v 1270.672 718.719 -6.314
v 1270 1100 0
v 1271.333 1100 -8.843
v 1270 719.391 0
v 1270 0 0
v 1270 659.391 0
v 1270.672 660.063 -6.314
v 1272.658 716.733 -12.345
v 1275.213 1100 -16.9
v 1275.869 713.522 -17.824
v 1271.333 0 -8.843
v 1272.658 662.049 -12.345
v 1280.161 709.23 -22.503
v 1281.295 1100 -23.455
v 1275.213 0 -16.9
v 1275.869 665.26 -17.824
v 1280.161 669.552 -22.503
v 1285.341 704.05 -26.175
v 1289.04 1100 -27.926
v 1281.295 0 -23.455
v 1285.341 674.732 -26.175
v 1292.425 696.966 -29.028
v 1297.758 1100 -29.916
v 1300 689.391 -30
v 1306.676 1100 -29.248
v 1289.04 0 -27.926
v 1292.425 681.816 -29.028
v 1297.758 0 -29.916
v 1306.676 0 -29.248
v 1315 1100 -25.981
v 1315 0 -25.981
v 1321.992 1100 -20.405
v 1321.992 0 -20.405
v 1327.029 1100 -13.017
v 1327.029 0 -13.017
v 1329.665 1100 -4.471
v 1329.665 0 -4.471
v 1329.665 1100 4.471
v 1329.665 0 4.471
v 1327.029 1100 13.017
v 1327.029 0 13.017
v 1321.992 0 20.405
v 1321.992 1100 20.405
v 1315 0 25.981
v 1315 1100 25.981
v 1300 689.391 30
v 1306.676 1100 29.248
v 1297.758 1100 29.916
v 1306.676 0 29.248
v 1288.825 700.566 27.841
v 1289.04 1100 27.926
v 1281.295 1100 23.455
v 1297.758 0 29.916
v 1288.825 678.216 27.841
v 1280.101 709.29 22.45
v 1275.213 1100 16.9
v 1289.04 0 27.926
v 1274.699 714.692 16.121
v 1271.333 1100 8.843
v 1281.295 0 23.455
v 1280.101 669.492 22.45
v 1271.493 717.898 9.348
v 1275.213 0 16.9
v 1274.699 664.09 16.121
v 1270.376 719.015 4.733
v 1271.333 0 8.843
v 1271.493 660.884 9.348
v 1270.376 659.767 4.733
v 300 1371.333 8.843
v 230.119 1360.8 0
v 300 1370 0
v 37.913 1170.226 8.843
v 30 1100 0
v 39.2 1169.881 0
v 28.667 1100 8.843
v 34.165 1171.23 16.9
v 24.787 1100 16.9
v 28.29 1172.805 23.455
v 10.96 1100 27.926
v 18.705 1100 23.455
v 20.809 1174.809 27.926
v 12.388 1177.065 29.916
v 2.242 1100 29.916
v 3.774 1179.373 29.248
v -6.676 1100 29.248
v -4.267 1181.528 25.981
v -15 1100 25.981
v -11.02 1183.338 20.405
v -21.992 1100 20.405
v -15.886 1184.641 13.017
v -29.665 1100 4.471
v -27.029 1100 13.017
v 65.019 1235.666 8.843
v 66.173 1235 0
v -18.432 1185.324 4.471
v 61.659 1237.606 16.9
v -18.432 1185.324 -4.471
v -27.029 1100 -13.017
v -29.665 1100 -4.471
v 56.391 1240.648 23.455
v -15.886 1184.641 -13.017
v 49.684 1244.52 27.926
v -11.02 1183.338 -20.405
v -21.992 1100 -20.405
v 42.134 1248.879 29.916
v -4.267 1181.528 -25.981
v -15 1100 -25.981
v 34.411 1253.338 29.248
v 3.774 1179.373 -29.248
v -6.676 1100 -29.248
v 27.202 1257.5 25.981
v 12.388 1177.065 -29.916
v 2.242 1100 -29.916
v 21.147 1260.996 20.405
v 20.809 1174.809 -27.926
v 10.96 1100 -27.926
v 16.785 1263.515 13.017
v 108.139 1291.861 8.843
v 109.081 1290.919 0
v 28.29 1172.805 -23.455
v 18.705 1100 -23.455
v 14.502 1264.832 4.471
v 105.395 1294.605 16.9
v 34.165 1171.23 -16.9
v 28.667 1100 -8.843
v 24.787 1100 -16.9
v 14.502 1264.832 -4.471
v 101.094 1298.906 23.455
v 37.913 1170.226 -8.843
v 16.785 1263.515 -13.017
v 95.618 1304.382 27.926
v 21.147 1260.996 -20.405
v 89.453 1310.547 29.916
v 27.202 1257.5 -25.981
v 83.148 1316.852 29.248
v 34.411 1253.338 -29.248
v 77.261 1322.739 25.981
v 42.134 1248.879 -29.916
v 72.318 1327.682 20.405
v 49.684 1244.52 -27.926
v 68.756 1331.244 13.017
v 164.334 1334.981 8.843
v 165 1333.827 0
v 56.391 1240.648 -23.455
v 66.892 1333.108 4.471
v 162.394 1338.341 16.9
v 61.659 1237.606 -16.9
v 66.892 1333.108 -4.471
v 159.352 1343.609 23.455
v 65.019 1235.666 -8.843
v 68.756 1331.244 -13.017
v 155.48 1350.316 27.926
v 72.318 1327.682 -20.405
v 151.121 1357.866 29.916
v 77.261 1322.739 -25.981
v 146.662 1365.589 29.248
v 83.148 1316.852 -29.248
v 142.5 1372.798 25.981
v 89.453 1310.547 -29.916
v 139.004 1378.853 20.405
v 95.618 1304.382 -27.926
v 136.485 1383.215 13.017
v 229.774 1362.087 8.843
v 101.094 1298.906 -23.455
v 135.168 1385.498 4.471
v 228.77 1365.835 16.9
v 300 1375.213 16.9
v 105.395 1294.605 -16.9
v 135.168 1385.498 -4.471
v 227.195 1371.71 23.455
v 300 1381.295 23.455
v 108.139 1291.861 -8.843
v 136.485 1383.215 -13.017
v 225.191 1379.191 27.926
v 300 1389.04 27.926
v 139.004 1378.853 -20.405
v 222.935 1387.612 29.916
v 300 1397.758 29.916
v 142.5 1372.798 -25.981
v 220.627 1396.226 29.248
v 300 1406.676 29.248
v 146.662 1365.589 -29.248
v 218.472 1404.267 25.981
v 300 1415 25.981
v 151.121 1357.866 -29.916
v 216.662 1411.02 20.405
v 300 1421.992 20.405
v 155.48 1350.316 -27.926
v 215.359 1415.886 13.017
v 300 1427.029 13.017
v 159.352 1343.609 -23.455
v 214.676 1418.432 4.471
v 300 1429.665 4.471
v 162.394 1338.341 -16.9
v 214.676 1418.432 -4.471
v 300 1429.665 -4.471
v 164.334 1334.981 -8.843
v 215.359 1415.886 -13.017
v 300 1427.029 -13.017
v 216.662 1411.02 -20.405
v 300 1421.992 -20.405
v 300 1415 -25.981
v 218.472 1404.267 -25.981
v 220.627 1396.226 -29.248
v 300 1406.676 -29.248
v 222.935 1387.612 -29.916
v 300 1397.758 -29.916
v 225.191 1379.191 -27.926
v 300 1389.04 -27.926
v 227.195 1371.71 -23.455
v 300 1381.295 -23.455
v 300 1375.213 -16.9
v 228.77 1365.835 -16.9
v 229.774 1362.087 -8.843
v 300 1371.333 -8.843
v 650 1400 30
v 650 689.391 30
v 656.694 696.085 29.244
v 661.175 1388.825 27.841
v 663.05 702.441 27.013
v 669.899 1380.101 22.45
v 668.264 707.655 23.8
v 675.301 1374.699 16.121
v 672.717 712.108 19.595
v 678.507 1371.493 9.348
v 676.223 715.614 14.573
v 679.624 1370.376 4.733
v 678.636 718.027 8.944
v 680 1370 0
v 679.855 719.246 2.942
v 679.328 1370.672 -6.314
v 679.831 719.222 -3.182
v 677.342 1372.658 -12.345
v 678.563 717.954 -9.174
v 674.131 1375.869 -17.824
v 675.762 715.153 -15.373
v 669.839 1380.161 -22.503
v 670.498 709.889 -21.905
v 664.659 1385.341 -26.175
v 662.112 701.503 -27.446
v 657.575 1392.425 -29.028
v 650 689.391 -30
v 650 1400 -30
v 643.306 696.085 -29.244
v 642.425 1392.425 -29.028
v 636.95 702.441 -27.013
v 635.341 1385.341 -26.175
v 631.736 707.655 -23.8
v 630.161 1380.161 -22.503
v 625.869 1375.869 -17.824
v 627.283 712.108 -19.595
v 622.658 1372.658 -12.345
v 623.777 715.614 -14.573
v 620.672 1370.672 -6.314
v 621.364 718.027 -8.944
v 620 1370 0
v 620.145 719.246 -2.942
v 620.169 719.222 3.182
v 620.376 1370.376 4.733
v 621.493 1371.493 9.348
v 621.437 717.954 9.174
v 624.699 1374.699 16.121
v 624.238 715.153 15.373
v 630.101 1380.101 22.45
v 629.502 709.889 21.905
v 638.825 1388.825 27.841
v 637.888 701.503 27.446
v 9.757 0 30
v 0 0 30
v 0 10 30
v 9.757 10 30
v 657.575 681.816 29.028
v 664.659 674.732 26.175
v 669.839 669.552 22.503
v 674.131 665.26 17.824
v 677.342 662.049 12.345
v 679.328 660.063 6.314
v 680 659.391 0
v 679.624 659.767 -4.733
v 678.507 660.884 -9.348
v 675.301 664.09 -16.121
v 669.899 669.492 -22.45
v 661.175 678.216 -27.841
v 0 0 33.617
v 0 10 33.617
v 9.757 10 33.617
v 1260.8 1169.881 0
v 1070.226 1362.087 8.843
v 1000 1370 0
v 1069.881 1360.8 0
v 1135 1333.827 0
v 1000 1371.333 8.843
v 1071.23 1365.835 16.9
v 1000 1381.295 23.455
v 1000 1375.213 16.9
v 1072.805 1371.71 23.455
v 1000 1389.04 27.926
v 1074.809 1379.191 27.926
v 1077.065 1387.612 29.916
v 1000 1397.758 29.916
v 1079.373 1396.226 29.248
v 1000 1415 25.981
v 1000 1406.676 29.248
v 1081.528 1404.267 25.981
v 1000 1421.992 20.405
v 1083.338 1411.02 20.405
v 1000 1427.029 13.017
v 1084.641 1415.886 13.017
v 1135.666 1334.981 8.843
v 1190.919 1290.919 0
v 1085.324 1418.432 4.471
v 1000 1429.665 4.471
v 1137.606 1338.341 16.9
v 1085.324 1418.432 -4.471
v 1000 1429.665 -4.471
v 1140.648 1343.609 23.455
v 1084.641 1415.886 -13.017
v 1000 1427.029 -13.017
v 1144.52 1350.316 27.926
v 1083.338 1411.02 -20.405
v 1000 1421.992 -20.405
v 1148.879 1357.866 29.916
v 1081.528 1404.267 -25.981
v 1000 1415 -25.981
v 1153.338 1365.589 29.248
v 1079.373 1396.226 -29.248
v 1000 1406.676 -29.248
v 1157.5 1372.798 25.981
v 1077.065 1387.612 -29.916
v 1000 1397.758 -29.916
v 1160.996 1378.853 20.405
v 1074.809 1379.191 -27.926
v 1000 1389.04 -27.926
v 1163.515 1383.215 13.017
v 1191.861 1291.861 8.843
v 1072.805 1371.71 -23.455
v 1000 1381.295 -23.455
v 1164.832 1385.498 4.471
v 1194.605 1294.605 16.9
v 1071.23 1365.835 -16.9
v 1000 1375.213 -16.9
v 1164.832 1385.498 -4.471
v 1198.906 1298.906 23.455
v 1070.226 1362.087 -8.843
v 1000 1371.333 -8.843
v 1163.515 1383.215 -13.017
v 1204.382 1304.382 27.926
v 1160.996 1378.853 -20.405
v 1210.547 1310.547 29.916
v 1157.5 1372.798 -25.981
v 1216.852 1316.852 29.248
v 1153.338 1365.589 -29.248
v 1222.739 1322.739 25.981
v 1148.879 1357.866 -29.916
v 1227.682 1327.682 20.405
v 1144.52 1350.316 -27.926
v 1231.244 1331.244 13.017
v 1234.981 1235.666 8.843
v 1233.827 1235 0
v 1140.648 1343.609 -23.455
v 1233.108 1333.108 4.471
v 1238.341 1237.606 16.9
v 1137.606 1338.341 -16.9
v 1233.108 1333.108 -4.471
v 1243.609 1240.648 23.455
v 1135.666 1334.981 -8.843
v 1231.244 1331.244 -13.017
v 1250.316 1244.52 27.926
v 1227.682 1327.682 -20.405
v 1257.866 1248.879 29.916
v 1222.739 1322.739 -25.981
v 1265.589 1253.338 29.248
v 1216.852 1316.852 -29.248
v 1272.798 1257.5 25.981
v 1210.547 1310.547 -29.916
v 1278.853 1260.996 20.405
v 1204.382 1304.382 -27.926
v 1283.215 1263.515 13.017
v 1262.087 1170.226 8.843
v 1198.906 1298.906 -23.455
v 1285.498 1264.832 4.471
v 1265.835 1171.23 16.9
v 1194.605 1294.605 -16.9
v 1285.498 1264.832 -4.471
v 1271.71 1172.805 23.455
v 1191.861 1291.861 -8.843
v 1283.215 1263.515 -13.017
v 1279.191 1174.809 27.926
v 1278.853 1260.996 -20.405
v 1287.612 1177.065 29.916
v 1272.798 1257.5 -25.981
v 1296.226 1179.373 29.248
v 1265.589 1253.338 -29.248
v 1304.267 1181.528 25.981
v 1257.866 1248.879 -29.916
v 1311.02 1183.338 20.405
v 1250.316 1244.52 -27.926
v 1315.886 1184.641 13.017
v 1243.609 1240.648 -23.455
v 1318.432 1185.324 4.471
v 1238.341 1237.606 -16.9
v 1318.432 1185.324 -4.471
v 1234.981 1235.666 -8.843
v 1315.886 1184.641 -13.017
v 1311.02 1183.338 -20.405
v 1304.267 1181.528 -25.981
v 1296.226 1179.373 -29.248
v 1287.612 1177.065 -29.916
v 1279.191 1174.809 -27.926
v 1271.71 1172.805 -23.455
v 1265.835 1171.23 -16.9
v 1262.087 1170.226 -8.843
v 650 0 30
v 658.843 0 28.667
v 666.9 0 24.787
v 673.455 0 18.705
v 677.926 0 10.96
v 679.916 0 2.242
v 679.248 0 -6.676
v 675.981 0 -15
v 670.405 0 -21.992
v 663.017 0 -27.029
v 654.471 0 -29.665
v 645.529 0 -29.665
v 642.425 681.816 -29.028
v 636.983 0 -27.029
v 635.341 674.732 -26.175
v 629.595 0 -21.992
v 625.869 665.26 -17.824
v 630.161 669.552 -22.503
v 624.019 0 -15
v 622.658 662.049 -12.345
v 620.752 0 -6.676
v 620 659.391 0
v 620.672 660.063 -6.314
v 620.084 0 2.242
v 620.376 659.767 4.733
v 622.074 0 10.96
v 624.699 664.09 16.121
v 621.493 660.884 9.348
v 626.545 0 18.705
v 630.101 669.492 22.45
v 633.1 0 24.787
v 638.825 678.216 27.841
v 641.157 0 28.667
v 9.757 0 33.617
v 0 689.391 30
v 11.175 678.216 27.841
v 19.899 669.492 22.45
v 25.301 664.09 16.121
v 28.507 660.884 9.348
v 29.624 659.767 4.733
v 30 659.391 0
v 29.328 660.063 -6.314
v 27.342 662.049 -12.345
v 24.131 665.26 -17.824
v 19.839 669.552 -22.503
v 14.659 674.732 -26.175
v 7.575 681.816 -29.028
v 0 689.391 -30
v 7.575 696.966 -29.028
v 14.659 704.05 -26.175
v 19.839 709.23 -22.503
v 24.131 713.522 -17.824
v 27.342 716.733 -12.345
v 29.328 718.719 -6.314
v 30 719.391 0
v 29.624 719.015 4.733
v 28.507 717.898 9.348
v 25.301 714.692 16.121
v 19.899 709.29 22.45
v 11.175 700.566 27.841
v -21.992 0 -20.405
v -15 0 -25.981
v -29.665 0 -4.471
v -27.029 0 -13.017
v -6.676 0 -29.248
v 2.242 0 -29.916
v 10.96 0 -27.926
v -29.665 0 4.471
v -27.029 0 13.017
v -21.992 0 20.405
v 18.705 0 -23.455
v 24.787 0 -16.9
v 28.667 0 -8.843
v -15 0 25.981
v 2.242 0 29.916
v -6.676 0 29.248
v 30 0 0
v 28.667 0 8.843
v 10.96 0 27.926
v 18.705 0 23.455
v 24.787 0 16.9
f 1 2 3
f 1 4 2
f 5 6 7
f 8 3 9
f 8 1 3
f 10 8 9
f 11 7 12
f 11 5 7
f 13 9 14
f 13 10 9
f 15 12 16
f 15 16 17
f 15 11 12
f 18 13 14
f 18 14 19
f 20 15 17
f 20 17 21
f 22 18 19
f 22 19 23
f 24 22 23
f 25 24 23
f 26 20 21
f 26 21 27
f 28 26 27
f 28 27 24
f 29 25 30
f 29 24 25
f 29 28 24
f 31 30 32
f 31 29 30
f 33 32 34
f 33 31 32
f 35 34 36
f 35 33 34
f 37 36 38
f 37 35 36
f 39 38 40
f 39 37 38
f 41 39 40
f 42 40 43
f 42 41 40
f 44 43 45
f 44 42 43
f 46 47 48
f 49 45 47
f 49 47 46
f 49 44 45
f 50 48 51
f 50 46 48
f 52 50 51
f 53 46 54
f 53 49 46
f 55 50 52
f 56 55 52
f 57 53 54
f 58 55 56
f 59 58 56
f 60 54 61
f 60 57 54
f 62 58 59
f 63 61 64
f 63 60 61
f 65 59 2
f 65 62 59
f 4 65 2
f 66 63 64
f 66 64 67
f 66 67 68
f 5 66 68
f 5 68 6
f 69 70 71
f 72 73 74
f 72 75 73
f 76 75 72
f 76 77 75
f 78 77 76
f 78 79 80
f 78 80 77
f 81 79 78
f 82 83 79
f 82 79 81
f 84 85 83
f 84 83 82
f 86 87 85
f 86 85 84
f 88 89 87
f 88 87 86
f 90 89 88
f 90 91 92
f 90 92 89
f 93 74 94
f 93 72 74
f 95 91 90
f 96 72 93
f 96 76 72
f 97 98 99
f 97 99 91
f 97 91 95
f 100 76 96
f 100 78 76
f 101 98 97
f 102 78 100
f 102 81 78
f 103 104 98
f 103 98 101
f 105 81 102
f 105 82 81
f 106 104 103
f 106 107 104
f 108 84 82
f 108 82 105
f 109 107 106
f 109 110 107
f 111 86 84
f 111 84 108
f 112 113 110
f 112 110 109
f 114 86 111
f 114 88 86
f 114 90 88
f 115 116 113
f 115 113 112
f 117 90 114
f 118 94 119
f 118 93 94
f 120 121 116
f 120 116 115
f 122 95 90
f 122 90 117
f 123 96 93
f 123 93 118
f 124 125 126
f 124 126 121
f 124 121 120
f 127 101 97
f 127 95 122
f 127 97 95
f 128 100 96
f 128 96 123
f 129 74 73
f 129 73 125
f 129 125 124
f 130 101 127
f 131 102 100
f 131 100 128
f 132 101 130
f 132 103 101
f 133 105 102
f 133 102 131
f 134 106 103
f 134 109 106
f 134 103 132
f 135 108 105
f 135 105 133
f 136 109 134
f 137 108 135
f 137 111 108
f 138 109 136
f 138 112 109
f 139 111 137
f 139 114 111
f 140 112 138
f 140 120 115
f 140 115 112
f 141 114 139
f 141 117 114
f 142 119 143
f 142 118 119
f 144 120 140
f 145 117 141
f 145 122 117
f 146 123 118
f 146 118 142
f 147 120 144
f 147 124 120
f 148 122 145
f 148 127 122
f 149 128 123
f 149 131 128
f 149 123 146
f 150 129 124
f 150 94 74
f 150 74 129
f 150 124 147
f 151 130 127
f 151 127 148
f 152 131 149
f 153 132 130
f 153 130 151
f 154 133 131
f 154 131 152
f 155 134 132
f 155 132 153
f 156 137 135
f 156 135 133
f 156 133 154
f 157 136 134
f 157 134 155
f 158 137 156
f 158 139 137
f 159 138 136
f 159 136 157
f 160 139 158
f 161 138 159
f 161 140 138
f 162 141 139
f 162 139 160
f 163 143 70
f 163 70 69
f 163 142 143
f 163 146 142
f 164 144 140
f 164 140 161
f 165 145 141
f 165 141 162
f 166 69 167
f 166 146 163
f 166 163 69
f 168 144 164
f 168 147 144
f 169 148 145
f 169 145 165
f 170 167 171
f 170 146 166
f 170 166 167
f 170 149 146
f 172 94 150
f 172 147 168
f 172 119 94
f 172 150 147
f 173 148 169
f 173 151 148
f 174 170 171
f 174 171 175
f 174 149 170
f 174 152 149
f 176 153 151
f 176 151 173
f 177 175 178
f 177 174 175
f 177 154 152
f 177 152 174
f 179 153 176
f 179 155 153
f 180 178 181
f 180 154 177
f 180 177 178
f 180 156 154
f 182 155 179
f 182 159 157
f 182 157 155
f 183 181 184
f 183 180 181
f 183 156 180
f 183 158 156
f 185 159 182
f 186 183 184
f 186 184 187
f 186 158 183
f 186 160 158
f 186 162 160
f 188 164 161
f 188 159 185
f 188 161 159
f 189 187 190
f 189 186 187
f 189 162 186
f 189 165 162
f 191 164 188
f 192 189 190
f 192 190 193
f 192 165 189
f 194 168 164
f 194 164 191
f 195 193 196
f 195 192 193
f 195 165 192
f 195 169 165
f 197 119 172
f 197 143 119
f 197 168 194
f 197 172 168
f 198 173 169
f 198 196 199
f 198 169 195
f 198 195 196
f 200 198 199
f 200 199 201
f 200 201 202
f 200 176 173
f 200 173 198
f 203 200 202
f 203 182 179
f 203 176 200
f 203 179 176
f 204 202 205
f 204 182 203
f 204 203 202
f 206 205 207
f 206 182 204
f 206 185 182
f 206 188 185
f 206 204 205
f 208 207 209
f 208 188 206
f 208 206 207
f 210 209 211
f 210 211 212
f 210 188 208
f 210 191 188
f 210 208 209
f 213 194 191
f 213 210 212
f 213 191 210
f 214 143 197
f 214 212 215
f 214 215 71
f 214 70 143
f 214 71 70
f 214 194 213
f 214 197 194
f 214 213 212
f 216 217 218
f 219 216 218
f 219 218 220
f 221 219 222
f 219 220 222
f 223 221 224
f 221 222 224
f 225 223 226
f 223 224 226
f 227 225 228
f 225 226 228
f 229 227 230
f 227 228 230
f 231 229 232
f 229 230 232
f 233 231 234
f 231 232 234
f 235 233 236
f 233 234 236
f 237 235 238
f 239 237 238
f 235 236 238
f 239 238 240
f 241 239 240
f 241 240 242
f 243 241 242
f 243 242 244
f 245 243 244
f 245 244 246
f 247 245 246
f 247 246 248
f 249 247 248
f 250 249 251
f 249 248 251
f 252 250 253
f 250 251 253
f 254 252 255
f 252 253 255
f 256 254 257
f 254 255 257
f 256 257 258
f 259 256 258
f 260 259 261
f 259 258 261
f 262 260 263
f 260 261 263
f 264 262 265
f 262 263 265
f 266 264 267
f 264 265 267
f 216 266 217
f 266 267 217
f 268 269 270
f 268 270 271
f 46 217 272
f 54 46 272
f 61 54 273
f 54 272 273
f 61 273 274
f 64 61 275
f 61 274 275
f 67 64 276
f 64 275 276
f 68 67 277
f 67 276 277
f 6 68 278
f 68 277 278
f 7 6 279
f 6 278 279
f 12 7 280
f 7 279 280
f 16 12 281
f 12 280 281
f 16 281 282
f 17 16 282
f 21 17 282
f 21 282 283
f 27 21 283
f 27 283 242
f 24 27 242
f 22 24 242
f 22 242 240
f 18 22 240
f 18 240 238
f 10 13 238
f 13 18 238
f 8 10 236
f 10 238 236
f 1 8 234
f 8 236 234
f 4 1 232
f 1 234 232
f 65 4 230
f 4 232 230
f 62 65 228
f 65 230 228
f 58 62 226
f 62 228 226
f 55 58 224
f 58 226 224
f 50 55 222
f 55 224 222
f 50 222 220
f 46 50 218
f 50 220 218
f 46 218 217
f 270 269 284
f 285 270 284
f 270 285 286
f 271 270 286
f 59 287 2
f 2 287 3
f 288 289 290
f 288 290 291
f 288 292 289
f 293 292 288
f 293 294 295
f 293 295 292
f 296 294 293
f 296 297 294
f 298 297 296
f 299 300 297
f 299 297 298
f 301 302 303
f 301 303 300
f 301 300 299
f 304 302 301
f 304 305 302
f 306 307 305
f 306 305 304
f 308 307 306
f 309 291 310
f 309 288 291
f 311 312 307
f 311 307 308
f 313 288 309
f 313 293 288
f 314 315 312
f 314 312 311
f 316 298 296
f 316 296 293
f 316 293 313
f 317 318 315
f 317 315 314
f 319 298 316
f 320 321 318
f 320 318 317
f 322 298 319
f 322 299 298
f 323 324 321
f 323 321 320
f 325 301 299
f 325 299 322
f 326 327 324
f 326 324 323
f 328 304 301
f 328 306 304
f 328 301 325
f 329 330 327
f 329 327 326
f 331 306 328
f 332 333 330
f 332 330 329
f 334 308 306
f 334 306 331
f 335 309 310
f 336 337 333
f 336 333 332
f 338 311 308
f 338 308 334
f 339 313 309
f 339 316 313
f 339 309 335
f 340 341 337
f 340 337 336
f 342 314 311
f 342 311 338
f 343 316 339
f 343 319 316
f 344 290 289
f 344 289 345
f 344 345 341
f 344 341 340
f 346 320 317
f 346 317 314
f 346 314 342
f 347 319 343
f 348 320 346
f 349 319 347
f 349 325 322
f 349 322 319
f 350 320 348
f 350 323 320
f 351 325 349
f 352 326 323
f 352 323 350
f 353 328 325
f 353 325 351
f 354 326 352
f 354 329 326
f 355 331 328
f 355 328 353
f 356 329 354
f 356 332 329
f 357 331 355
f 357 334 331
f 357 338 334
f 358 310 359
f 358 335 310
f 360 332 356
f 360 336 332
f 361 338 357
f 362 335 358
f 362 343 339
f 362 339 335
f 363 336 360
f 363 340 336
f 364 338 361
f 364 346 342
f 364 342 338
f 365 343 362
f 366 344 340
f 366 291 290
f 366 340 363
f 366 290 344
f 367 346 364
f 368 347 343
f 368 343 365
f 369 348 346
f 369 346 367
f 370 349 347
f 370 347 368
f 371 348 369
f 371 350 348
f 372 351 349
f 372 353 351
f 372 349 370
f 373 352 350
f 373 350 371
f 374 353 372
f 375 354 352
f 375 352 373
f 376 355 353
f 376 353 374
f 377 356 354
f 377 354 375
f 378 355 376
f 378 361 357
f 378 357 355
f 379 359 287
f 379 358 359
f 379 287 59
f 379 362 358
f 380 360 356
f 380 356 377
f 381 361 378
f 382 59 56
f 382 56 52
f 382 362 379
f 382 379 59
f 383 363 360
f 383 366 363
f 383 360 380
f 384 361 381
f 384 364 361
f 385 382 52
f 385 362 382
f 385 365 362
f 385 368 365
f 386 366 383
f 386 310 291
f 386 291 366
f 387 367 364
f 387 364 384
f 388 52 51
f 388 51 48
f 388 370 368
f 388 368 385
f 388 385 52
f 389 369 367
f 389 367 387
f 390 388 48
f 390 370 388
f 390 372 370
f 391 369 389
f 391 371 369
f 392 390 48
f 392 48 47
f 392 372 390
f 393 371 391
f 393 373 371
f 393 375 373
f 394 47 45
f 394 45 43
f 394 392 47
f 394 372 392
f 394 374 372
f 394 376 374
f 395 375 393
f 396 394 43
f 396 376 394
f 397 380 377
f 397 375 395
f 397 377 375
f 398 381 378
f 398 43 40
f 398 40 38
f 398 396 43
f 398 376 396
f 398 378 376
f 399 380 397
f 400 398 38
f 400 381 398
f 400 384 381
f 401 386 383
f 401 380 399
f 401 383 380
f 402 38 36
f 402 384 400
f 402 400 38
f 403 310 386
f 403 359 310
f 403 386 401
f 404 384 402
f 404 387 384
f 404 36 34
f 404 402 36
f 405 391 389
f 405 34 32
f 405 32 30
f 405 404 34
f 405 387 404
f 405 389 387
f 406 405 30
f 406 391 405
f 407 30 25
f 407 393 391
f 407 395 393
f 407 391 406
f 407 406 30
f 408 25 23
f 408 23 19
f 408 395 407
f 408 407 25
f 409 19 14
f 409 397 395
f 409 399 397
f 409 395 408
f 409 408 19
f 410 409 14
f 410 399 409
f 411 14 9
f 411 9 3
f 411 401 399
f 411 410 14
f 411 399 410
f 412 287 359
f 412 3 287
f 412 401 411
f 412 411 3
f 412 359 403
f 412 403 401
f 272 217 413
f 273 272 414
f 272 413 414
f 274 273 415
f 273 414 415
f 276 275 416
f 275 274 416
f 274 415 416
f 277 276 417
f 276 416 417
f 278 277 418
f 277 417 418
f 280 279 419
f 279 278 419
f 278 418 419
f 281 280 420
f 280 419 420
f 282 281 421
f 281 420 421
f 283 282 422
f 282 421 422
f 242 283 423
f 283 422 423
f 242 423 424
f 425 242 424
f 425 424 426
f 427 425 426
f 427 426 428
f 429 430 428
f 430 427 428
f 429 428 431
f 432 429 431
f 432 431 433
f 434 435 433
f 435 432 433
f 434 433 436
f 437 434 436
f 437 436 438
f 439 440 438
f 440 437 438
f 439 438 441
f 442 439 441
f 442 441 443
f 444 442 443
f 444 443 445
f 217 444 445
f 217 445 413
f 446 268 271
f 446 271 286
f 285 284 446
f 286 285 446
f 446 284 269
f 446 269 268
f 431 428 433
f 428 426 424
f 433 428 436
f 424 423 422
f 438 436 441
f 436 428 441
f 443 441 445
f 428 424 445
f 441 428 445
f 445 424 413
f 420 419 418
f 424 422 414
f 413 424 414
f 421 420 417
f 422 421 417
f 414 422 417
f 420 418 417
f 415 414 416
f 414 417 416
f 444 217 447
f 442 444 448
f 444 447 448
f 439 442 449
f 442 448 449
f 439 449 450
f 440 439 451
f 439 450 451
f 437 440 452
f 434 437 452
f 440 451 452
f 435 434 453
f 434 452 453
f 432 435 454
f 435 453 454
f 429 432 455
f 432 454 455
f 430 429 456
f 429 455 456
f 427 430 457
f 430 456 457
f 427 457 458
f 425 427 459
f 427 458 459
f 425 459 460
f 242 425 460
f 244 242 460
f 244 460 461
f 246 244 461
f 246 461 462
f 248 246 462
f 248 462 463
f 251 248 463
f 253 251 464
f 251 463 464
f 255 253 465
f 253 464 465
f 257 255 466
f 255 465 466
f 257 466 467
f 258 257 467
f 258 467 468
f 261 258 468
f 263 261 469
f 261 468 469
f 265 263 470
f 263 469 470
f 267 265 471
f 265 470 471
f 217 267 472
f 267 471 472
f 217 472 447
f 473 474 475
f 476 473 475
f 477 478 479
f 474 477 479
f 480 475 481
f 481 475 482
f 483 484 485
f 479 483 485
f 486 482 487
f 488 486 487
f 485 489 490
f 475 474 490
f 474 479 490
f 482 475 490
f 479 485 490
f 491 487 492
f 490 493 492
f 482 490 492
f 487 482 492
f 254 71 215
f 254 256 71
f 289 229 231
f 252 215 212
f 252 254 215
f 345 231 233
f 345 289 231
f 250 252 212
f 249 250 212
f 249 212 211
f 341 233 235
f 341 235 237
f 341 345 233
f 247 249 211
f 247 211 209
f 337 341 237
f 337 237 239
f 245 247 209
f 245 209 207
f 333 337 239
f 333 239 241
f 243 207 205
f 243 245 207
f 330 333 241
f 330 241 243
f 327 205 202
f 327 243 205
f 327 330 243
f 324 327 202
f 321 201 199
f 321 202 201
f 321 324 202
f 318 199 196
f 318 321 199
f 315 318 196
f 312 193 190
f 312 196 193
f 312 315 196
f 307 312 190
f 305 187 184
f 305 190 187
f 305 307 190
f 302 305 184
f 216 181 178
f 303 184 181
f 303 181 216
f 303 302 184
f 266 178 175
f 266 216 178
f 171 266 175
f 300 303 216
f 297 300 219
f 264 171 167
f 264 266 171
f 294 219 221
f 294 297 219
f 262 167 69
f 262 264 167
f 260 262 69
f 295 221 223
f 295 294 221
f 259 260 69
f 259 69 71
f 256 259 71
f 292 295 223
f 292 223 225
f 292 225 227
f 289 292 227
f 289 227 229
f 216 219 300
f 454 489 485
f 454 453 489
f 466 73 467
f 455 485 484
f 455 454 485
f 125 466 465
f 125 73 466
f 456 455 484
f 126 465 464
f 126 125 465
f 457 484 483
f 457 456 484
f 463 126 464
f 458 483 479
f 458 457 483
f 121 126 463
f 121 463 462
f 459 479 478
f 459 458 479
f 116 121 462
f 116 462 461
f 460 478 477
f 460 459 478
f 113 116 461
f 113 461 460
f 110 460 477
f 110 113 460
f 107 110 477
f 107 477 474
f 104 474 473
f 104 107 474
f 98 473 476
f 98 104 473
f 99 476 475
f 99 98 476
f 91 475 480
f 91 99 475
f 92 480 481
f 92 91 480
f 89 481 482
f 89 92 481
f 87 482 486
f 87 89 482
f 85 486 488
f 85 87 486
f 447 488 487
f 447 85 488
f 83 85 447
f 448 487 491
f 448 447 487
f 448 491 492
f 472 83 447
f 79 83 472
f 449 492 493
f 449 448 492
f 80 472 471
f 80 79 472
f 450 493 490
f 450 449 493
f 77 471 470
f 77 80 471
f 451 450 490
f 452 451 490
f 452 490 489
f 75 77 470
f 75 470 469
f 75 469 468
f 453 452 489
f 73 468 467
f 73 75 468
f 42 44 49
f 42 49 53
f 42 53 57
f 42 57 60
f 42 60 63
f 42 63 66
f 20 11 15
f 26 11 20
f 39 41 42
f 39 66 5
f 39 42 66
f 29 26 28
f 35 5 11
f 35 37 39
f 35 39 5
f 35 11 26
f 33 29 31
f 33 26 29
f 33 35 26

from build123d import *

# Parameters (mm, degrees)
SKETCH_2_R      = 30
SKETCH_4_R      = 30
EXTRUDE_1_DEPTH = 1400
SKETCH_5_R      = 30
EXTRUDE_2_DEPTH = 1300
SKETCH_6_W      = 9.757055714
SKETCH_6_H      = 3.616600388
EXTRUDE_3_DEPTH = 10


with BuildPart() as part:
    # 扫描1: sweep along a path in 草图1
    with BuildLine(Plane.XY) as sweep_1_path:
        Line((0, 0), (0, 1100))
        ThreePointArc((0, 1100), (87.867965644, 1312.132034356), (300, 1400))
        Line((300, 1400), (1000, 1400))
        ThreePointArc((1000, 1400), (1212.132034356, 1312.132034356), (1300, 1100))
        Line((1300, 1100), (1300, 0))
    # 草图2 → 扫描1 (sweep)
    with BuildSketch(Plane(origin=(0, 0, 0), x_dir=(1, 0, 0), z_dir=(0, 1, 0))):
        Circle(SKETCH_2_R)
    sweep(path=sweep_1_path.line)

    # 草图4 → 凸台-拉伸1 (add)
    with BuildSketch(Plane(origin=(0, 0, 0), x_dir=(1, 0, 0), z_dir=(0, 1, 0))):
        with Locations(Location((650, 0, 0), (0, 0, 270))):
            Circle(SKETCH_4_R)
    extrude(amount=EXTRUDE_1_DEPTH)

    # 草图5 → 凸台-拉伸2 (add)
    with BuildSketch(Plane(origin=(0, 0, 0), x_dir=(0, 0, -1), z_dir=(1, 0, 0))):
        with Locations(Location((0, 689.391024167, 0), (0, 0, 180))):
            Circle(SKETCH_5_R)
    extrude(amount=EXTRUDE_2_DEPTH)


with BuildPart() as body_2:
    # 草图6 → 凸台-拉伸3 (new body)
    with BuildSketch(Plane.XZ):
        with Locations((4.878527857, 31.808300194)):
            Rectangle(SKETCH_6_W, SKETCH_6_H)
    extrude(amount=-EXTRUDE_3_DEPTH)


solid = Compound([part.part, body_2.part])
